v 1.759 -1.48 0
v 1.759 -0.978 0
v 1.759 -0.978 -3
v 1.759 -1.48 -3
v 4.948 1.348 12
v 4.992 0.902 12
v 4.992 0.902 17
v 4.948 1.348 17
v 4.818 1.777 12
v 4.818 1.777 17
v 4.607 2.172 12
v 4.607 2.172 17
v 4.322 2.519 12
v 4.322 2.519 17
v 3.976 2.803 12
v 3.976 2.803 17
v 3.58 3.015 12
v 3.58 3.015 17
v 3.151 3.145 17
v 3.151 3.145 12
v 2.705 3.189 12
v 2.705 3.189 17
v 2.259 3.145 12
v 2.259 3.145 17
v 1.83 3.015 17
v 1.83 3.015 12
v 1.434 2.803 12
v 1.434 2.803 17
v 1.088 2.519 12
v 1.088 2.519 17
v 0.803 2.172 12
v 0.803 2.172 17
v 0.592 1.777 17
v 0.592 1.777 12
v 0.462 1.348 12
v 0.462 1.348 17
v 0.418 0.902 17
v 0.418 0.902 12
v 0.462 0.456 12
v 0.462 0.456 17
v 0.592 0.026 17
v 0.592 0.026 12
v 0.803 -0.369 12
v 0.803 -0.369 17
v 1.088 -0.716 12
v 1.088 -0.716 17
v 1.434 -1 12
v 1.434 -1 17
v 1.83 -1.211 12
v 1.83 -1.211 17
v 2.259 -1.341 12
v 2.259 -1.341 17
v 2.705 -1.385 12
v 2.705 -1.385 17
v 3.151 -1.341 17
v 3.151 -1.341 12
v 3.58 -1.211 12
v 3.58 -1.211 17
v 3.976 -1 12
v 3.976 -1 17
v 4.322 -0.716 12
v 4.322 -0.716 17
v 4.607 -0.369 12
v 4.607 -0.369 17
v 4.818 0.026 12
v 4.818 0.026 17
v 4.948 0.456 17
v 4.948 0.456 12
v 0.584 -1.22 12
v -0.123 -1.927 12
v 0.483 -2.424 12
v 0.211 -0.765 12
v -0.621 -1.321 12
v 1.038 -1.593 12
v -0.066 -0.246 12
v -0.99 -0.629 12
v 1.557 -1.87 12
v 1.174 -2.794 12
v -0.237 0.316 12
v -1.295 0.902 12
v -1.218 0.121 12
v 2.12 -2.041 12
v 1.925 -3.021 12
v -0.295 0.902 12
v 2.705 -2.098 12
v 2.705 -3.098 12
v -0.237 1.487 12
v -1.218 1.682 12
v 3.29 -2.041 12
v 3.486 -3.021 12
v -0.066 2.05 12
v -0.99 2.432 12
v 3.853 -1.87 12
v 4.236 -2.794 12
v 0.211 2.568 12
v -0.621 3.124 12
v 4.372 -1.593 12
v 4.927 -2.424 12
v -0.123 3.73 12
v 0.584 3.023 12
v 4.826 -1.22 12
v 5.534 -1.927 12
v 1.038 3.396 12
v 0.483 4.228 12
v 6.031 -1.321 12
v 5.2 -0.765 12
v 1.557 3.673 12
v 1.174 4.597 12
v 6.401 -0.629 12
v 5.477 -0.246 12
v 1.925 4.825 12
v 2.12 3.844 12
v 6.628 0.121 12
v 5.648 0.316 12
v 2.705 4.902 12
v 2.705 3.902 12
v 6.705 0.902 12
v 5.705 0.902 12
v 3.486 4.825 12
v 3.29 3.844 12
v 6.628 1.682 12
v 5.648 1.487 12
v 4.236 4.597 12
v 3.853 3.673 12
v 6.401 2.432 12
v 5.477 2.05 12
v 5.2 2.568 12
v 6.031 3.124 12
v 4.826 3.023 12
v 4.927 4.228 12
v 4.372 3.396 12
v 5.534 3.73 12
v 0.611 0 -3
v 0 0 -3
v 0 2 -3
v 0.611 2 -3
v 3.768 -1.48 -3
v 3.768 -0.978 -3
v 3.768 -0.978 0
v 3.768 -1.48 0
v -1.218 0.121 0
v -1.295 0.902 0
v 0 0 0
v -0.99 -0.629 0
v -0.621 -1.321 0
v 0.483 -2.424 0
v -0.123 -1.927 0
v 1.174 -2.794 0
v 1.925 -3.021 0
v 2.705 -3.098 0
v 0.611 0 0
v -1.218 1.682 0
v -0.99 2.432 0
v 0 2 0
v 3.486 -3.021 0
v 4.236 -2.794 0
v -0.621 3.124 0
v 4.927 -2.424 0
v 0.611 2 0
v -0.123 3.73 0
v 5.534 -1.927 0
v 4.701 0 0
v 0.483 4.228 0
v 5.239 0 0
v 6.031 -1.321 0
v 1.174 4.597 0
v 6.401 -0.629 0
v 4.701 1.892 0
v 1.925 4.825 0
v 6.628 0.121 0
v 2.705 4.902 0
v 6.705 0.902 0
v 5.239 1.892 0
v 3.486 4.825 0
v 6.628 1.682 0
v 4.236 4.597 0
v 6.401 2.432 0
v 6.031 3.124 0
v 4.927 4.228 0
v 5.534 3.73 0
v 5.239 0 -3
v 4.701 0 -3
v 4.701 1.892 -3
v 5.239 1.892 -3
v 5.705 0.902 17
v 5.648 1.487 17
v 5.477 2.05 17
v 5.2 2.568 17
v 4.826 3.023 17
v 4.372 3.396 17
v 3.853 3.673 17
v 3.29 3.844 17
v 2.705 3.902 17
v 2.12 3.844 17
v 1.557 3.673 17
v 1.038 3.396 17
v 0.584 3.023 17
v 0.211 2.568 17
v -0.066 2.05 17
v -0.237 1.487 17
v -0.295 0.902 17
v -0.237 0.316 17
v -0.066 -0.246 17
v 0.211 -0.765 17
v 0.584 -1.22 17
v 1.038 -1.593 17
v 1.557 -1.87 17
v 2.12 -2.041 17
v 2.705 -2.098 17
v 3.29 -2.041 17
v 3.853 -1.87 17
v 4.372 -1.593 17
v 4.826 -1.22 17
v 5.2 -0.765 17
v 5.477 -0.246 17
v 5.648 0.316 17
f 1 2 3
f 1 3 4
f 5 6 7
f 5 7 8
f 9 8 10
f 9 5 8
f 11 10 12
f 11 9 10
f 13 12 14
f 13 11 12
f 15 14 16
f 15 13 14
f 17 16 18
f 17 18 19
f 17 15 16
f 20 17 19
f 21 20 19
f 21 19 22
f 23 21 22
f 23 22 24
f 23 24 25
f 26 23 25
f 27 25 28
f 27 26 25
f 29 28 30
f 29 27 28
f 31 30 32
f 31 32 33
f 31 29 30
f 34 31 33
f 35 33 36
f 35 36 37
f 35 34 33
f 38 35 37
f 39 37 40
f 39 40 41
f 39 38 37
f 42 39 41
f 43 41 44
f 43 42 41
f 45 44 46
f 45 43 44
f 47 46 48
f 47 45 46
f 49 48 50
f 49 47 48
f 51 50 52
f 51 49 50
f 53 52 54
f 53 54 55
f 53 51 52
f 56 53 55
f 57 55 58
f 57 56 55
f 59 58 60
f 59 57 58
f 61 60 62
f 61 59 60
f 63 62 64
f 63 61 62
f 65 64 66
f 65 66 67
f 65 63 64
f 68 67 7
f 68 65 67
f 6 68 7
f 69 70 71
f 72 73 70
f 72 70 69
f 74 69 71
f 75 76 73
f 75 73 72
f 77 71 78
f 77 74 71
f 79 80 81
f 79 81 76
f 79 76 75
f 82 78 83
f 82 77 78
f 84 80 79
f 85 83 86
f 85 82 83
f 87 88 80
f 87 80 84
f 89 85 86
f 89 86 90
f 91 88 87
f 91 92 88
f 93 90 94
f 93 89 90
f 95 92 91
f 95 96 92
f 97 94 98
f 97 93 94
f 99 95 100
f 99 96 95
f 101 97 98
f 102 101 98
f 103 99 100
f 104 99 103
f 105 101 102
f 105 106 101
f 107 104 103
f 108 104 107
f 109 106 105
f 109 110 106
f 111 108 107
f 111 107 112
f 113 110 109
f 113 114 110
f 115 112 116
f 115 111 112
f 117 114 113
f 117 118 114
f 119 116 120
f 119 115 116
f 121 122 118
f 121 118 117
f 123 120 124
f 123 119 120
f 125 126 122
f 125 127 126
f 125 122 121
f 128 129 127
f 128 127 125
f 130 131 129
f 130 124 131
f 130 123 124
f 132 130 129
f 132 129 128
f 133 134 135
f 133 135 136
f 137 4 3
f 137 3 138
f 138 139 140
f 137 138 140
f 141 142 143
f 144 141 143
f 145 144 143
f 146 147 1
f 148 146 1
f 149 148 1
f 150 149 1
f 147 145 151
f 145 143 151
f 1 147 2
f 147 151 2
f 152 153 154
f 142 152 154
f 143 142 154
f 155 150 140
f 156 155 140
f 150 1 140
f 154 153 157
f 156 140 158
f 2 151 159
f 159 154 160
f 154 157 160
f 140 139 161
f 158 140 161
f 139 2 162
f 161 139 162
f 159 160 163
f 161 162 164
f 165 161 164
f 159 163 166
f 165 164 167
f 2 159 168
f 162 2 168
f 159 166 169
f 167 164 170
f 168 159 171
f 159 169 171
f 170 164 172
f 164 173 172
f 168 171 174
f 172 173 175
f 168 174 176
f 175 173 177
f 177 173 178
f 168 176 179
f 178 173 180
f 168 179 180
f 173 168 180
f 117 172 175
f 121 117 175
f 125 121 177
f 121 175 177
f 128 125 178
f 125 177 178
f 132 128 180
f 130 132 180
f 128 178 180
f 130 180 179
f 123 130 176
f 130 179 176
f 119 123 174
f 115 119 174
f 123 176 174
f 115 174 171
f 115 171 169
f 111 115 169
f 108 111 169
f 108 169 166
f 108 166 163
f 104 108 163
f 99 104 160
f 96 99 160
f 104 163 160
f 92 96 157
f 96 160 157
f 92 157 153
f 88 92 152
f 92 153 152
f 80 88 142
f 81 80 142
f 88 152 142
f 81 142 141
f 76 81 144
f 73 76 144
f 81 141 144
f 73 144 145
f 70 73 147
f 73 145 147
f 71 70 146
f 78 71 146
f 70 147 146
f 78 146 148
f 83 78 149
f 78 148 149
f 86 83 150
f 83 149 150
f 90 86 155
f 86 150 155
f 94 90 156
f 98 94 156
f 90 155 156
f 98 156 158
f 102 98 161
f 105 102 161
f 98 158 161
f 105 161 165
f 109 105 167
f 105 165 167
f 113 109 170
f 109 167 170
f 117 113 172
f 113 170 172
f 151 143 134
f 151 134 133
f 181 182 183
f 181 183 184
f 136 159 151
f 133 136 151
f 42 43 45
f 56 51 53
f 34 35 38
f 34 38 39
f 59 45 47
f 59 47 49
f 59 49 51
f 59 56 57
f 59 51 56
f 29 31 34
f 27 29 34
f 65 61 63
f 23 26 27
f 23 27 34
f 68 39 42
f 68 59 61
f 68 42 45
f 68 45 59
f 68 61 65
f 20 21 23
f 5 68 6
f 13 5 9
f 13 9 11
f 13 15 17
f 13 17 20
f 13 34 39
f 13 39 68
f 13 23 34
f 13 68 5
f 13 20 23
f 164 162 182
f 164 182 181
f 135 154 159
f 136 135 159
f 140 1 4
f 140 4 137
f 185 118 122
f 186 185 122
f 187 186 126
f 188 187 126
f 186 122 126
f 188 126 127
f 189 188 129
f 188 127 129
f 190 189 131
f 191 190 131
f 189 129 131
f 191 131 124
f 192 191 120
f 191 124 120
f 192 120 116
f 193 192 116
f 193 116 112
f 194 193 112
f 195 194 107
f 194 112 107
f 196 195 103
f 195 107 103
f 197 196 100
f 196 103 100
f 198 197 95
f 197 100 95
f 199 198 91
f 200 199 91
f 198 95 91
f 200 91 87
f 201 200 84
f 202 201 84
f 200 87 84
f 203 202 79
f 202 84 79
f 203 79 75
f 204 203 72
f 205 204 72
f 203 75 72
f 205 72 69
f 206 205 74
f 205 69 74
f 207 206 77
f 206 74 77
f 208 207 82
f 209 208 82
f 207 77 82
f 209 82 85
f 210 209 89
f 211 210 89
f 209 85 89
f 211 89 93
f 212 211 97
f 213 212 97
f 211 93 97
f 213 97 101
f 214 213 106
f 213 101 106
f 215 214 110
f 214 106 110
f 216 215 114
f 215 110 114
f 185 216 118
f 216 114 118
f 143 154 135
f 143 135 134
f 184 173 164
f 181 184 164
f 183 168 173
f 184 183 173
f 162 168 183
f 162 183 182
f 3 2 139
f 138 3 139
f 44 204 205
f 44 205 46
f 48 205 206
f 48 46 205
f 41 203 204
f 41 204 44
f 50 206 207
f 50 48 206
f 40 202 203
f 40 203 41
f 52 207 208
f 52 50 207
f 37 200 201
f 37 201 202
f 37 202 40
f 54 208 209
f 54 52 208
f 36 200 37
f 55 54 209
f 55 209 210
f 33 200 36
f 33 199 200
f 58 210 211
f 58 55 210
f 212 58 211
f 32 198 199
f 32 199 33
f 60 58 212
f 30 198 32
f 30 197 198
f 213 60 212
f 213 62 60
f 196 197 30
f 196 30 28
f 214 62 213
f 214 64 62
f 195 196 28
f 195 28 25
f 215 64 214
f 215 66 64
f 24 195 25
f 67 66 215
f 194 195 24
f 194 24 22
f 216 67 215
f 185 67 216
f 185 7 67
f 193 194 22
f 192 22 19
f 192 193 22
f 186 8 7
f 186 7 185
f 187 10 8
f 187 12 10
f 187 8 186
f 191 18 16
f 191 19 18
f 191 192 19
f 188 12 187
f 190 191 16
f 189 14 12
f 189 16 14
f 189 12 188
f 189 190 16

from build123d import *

# Parameters (mm, degrees)
F0_R     = 4
F1_DEPTH = 12
F2_R     = 3
F2_R_2   = 2.287122
F3_DEPTH = 5
F4_W     = 0.61053
F4_H     = 1.999993
F4_W_2   = 0.53819
F4_H_2   = 1.892356
F4_W_3   = 2.00924
F4_H_3   = 0.50231
F5_DEPTH = 3


with BuildPart() as f1:
    # F0 (on Top) → F1 (new body)
    with BuildSketch(Plane.XY):
        with Locations((2.705152, 0.901718)):
            Circle(F0_R)
    extrude(amount=F1_DEPTH)

    # F2 (on face) → F3 (join)
    with BuildSketch(Plane.XY.offset(12)):
        with Locations((2.705152, 0.901718)):
            Circle(F2_R)
        with Locations((2.705152, 0.901718)):
            Circle(F2_R_2, mode=Mode.SUBTRACT)
    extrude(amount=F3_DEPTH)

    # F4 (on face) → F5 (join)
    with BuildSketch(Plane(origin=(0, 0, 0), x_dir=(1, 0, 0), z_dir=(0, 0, -1))):
        with Locations((0.305265, -0.999996)):
            Rectangle(F4_W, F4_H)
        with Locations((4.969864, -0.946178)):
            Rectangle(F4_W_2, F4_H_2)
        with Locations((2.763287, 1.229143)):
            Rectangle(F4_W_3, F4_H_3)
    extrude(amount=F5_DEPTH)


solid = f1.part
